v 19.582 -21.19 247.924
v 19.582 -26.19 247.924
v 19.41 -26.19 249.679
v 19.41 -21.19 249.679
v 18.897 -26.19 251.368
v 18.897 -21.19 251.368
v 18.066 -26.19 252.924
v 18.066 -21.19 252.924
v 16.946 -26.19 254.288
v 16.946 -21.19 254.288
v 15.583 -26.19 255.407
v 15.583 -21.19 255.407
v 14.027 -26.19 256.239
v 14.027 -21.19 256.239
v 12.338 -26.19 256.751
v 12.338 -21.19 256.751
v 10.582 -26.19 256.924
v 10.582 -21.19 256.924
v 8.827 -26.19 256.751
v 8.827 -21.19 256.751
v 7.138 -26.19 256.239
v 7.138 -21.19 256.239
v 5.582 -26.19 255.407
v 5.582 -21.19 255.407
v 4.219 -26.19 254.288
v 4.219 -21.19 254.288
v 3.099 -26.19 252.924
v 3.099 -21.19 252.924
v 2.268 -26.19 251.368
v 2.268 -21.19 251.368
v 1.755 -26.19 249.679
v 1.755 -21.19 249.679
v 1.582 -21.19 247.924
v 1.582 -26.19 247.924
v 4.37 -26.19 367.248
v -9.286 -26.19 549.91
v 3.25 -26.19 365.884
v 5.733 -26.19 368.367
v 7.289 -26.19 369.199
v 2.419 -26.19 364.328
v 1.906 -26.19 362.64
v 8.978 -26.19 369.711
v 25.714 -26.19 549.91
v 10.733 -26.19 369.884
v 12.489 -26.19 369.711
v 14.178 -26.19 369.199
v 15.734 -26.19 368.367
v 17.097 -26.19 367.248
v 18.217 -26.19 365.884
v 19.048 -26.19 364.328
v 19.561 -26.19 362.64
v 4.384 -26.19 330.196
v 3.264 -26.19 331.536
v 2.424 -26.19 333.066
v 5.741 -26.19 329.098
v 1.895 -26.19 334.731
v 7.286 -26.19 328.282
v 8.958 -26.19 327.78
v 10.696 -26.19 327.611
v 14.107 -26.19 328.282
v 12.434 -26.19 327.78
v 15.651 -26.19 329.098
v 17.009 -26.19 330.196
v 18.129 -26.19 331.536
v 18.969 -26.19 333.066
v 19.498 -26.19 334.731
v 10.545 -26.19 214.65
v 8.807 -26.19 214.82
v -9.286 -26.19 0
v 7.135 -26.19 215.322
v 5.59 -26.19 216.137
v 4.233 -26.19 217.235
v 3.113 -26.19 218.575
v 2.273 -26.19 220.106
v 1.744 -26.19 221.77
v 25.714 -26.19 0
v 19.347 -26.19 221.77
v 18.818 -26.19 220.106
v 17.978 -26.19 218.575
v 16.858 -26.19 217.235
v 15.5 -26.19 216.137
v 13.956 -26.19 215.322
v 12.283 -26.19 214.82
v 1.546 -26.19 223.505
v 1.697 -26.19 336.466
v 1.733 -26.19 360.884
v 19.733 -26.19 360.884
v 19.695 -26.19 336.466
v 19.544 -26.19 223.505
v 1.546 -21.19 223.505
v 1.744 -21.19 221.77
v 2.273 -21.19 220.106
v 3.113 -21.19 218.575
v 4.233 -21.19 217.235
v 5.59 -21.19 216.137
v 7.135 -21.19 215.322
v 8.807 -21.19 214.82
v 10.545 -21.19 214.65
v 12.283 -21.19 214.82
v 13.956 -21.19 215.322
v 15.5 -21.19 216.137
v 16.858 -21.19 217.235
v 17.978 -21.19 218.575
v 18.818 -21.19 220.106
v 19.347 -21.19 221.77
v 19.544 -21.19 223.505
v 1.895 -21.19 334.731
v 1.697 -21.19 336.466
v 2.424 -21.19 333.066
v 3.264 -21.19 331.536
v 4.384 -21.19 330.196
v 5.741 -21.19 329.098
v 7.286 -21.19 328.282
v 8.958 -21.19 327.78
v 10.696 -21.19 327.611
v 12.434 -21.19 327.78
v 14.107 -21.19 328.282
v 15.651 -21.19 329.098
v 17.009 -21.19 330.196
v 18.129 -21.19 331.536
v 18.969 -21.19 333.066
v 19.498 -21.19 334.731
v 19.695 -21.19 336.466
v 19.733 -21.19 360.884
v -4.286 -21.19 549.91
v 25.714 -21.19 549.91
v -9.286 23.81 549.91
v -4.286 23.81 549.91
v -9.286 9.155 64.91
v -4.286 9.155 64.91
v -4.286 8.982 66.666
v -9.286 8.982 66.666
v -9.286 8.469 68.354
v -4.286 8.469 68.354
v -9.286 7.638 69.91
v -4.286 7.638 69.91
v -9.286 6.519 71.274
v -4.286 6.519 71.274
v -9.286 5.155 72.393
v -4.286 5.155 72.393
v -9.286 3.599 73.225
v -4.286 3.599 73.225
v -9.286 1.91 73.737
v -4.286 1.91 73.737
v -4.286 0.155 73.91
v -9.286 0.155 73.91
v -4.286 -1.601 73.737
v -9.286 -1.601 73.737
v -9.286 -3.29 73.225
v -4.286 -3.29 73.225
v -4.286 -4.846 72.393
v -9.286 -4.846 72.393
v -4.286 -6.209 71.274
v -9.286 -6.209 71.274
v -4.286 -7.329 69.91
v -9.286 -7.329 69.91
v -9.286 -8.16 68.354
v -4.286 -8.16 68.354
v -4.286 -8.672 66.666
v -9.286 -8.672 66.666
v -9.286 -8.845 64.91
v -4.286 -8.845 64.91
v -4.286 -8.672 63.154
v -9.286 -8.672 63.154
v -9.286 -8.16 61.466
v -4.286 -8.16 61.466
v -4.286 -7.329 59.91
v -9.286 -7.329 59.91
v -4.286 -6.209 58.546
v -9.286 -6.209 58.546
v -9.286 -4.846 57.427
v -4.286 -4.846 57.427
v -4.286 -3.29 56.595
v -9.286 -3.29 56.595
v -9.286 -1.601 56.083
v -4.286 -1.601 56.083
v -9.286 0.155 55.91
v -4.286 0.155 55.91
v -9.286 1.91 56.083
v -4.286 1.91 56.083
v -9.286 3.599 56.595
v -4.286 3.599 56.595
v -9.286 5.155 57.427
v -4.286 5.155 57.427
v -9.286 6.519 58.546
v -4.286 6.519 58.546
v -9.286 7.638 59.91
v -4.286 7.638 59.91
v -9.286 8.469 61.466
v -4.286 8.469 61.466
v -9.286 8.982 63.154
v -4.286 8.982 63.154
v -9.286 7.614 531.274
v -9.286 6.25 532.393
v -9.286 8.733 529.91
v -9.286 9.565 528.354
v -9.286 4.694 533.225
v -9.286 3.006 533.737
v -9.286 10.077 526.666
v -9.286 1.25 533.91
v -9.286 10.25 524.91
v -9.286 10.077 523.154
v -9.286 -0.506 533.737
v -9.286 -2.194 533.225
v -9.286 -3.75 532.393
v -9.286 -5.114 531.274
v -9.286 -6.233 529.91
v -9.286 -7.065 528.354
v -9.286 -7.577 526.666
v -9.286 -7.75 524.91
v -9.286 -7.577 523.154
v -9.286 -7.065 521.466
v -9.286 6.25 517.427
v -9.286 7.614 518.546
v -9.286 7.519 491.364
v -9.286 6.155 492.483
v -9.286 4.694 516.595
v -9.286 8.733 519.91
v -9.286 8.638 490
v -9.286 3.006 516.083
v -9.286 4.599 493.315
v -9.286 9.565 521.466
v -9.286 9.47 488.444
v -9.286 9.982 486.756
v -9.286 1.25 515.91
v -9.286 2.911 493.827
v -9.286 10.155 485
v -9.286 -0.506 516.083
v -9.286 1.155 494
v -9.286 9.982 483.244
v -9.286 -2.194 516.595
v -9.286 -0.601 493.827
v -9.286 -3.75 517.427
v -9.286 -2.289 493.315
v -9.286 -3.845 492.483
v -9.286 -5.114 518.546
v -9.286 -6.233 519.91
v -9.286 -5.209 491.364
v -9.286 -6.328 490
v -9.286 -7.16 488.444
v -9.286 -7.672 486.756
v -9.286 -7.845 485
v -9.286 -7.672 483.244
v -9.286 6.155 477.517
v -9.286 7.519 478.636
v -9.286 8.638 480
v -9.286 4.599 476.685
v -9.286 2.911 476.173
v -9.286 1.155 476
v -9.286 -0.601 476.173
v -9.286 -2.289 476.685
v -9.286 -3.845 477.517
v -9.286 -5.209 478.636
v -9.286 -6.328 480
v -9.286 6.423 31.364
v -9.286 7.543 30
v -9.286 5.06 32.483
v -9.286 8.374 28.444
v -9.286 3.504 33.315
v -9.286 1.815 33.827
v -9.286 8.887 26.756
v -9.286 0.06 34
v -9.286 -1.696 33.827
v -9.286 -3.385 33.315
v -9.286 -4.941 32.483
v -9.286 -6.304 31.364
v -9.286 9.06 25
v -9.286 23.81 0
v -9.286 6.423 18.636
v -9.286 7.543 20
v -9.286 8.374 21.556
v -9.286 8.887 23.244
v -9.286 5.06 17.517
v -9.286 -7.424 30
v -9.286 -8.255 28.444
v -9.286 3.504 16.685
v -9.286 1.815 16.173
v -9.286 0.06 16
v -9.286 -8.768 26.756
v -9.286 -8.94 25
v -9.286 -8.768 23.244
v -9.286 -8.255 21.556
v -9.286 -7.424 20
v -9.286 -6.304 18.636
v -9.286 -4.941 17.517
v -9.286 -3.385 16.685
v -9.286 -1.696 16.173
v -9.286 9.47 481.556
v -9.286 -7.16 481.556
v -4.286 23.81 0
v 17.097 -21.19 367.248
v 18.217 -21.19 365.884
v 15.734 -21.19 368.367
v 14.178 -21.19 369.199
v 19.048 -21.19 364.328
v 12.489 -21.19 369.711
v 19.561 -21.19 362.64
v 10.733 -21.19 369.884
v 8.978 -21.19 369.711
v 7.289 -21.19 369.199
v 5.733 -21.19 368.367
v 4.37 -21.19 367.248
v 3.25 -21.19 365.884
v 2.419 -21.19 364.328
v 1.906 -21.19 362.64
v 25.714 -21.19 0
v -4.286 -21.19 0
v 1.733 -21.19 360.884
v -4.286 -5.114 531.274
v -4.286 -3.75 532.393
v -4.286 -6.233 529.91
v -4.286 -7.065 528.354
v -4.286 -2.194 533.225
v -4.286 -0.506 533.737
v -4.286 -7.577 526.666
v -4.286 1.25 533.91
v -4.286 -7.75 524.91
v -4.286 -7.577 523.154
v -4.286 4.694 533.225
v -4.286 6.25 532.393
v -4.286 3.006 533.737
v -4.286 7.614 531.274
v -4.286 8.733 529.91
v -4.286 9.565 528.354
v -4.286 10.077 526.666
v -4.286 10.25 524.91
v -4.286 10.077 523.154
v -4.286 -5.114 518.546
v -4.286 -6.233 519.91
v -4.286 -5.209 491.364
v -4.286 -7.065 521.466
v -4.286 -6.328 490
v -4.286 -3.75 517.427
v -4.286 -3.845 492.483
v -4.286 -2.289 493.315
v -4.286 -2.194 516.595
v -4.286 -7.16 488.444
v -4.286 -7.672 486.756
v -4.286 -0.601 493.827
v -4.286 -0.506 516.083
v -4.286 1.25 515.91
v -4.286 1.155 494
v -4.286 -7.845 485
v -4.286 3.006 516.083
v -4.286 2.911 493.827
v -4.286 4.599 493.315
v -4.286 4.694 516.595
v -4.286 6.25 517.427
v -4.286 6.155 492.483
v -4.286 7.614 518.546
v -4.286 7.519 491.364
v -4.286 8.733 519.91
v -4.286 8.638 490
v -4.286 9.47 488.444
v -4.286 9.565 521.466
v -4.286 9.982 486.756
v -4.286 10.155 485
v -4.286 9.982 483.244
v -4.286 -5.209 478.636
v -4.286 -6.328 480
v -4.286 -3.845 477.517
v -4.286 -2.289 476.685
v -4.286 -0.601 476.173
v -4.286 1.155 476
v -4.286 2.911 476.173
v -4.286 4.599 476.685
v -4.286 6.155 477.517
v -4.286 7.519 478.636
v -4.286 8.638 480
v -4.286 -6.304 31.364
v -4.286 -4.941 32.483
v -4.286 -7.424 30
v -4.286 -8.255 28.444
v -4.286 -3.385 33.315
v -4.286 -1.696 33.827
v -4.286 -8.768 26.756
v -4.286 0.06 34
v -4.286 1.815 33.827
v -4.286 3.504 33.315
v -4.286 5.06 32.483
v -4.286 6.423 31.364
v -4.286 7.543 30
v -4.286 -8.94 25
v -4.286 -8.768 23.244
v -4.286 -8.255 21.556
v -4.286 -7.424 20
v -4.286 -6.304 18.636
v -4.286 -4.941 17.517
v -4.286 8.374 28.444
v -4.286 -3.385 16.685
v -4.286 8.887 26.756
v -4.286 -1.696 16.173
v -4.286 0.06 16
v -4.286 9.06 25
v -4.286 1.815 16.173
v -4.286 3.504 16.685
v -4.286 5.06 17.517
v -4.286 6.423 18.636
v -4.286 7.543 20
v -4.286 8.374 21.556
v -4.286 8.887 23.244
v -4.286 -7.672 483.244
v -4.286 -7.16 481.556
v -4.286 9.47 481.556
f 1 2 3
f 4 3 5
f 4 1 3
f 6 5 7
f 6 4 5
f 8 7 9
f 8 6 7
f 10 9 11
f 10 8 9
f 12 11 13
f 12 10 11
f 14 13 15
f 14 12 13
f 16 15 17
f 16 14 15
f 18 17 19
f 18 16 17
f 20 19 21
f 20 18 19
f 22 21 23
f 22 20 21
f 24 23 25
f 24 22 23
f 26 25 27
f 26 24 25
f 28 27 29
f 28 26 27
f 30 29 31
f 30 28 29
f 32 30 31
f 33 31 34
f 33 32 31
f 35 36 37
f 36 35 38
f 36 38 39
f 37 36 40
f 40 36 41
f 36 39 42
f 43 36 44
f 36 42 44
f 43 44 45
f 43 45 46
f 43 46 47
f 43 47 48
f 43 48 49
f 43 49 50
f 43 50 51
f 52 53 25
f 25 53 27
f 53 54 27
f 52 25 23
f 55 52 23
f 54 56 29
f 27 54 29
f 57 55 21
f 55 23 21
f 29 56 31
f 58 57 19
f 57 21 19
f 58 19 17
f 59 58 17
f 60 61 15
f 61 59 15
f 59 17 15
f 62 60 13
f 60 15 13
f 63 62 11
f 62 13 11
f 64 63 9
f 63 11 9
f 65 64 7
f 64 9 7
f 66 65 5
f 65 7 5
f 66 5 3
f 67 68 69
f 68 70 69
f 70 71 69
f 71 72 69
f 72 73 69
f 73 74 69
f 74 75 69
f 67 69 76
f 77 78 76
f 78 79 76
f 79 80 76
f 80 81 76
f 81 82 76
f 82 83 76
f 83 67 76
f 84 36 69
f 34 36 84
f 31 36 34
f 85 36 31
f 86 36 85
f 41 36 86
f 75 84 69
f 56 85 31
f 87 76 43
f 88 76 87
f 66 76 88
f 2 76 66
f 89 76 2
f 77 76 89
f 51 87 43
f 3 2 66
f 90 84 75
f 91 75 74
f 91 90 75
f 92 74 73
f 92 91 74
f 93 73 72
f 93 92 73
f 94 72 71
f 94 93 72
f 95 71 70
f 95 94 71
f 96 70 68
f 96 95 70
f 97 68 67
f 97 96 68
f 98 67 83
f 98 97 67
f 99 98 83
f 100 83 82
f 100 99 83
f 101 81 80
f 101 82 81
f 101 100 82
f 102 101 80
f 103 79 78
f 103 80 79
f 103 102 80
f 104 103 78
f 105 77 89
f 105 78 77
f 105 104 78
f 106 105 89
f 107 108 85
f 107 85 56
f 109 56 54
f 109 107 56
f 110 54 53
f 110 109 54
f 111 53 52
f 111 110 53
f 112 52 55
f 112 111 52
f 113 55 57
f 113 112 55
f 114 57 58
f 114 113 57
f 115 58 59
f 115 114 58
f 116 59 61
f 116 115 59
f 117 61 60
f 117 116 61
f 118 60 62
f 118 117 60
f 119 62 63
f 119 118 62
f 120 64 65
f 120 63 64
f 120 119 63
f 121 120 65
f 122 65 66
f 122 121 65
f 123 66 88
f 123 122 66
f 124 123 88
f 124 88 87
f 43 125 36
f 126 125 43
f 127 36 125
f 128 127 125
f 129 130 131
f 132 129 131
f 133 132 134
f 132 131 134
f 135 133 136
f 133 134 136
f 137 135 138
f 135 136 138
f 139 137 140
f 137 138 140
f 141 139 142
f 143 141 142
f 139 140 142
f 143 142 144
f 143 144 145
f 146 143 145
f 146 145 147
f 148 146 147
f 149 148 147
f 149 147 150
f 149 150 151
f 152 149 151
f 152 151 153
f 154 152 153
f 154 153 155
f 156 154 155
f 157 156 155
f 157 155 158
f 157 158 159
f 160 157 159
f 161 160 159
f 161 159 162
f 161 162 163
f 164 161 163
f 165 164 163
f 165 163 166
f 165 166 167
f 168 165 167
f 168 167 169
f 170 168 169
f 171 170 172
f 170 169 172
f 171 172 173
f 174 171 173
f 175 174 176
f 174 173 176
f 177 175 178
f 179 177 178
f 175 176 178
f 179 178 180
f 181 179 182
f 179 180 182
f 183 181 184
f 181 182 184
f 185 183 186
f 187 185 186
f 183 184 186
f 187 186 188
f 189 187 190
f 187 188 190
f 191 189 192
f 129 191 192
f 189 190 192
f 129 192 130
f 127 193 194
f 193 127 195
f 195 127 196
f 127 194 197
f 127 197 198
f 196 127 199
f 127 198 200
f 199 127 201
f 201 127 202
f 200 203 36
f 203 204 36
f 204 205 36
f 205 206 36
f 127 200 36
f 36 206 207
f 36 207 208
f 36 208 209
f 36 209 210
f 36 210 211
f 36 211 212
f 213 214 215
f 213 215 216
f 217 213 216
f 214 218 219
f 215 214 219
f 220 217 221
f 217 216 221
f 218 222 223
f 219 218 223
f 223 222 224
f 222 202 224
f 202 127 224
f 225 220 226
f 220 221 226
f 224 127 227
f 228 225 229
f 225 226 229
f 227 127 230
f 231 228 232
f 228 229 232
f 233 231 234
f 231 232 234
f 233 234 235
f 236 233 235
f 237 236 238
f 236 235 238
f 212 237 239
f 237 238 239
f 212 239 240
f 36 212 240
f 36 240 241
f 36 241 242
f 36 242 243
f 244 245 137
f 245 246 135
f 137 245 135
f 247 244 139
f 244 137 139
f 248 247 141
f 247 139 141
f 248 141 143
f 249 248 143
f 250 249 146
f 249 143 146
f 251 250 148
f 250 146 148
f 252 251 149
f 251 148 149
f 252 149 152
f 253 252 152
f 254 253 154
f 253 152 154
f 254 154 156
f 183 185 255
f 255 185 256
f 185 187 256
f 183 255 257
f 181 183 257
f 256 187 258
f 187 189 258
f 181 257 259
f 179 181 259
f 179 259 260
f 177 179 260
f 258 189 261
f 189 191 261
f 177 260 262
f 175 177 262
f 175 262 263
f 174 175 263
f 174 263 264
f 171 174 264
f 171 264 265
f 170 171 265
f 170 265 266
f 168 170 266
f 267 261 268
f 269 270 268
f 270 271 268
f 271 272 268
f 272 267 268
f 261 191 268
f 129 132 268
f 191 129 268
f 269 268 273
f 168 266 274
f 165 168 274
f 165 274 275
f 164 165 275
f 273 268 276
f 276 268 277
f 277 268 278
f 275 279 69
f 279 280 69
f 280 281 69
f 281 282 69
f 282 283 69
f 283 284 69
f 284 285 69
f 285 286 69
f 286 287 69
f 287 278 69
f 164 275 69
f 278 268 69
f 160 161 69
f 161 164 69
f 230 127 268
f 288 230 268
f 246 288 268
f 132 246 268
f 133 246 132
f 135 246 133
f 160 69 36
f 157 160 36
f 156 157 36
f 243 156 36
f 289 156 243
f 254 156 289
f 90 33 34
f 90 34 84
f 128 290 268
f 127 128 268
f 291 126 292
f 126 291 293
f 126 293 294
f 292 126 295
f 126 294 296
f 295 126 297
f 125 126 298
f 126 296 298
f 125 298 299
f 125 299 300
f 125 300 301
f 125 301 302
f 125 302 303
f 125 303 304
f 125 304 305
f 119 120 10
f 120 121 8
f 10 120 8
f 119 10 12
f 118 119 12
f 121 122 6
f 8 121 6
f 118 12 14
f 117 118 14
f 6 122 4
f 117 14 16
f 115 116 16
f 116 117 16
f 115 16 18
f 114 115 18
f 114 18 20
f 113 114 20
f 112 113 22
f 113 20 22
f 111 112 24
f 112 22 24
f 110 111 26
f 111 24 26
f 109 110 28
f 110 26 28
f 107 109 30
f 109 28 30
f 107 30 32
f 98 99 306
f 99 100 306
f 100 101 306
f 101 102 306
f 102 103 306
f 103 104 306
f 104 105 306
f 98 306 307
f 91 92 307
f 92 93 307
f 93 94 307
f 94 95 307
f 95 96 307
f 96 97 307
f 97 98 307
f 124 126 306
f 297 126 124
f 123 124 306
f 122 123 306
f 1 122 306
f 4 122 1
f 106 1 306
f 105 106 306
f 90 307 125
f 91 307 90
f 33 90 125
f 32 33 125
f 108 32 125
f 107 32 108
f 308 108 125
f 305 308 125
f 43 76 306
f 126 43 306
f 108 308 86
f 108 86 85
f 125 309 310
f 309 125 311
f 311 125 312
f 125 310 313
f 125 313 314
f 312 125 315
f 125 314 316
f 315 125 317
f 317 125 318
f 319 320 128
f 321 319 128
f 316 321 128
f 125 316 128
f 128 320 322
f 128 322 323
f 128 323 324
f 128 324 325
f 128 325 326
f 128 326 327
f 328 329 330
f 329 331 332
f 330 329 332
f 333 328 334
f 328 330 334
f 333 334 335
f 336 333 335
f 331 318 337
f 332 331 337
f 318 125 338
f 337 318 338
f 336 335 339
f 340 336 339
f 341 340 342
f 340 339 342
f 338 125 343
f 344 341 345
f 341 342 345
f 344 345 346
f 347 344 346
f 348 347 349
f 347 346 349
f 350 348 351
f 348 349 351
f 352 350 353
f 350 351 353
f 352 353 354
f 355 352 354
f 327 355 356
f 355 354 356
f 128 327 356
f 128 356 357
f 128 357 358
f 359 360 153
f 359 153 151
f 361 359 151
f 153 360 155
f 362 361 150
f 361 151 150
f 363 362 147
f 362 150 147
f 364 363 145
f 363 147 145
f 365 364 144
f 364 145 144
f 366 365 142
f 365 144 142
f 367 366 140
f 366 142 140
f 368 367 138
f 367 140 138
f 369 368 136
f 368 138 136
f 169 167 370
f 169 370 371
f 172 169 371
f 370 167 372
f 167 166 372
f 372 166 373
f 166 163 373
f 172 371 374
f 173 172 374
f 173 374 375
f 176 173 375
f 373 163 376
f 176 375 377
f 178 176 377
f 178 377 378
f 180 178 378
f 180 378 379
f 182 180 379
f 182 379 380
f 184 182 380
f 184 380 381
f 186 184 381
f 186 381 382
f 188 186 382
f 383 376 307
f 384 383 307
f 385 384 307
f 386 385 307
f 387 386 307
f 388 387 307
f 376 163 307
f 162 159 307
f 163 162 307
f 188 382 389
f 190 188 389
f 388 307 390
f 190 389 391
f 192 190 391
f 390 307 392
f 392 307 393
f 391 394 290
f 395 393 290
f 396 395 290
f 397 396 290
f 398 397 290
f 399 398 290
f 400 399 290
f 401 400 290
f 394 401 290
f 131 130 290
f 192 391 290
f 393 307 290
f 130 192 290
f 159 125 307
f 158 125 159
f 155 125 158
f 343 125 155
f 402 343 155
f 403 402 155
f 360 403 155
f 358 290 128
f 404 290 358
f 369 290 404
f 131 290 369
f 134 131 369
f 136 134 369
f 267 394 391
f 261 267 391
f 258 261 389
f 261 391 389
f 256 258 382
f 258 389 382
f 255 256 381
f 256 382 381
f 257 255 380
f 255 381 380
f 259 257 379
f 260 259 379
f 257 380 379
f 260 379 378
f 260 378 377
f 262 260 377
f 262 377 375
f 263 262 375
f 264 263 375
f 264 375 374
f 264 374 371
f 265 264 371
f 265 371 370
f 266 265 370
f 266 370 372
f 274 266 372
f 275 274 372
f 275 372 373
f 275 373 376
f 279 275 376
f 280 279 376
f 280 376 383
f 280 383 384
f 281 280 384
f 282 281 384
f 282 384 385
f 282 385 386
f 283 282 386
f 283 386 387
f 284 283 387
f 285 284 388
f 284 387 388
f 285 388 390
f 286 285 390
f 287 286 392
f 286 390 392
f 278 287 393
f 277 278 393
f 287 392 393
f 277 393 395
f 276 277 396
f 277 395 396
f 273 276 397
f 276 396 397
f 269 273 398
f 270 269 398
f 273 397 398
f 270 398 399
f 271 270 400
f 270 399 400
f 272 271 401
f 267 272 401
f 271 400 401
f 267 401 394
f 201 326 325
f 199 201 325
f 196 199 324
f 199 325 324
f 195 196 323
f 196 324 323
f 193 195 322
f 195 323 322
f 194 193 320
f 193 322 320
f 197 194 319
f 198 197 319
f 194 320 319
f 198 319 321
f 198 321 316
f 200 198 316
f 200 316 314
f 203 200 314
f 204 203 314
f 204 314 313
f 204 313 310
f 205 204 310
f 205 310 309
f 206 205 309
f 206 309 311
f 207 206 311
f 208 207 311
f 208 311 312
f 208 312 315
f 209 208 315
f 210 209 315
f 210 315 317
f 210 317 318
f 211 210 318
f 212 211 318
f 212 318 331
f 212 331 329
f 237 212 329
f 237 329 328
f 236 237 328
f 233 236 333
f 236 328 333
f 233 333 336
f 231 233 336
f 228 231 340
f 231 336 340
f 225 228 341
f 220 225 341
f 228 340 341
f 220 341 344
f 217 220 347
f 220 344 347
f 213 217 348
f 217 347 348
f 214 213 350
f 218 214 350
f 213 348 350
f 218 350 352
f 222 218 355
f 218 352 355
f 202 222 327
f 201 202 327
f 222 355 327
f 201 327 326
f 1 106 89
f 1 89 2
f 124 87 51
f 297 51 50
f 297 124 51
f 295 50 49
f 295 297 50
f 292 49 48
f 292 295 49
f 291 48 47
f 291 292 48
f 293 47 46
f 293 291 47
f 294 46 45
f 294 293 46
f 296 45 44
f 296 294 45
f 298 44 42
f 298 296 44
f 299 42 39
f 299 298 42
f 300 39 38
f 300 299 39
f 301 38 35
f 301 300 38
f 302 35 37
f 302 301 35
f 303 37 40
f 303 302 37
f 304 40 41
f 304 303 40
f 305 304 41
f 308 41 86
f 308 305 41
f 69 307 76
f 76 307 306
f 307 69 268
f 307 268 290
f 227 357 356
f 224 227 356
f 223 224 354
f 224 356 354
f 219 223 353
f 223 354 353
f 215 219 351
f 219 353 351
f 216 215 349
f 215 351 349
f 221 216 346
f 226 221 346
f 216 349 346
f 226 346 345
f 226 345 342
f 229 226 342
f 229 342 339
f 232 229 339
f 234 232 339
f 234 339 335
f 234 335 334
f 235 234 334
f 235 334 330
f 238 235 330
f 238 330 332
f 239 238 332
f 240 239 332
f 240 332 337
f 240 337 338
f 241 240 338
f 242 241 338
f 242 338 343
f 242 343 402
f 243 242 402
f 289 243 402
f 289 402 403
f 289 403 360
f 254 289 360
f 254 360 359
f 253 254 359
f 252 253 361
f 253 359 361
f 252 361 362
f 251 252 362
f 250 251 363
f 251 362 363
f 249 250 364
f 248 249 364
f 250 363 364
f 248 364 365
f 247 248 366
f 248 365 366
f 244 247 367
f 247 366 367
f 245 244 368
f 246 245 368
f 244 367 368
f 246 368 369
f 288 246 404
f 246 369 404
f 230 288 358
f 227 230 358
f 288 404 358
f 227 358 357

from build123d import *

# Parameters (mm, degrees)
BOSS_EXTRUDE1_DEPTH = 549.91
SKETCH2_R           = 9
CUT_EXTRUDE1_DEPTH  = 10
CUT_EXTRUDE2_DEPTH  = 10


with BuildPart() as part:
    # Sketch1 → Boss-Extrude1 (new body)
    with BuildSketch(Plane.XY):
        Polygon((-9.285714286, 23.80952381), (-9.285714286, -26.19047619), (25.714285714, -26.19047619), (25.714285714, -21.19047619), (-4.285714286, -21.19047619), (-4.285714286, 23.80952381), align=None)
    extrude(amount=BOSS_EXTRUDE1_DEPTH)

    # Sketch2 → Cut-Extrude1 (cut)
    with BuildSketch(Plane(origin=(-4.285714286, 0, 0), x_dir=(0, 0, -1), z_dir=(1, 0, 0))):
        with Locations(Location((-524.91, 1.249990258, 0), (0, 0, 90))):
            Circle(SKETCH2_R)
        with Locations(Location((-485, 1.154950897, 0), (0, 0, 90))):
            Circle(SKETCH2_R)
        with Locations(Location((-64.91, 0.154572913, 0), (0, 0, 90))):
            Circle(SKETCH2_R)
        with Locations(Location((-25, 0.059533551, 0), (0, 0, 90))):
            Circle(SKETCH2_R)
    extrude(amount=-CUT_EXTRUDE1_DEPTH, mode=Mode.SUBTRACT)

    # Sketch3 → Cut-Extrude2 (cut)
    with BuildSketch(Plane(origin=(0, -21.19047619, 0), x_dir=(1, 0, 0), z_dir=(0, 1, 0))):
        with BuildLine():
            Line((1.733492456, -360.884266397), (1.697419827, -336.465805265))
            ThreePointArc((1.697419827, -336.465805265), (10.6962494, -327.610947677), (19.695078973, -336.465805265))
            Line((19.695078973, -336.465805265), (19.733492456, -360.884266397))
            ThreePointArc((19.733492456, -360.884266397), (10.733492456, -369.884266397), (1.733492456, -360.884266397))
        make_face()
        with BuildLine():
            Line((1.582473361, -247.923607511), (1.546400733, -223.505146379))
            ThreePointArc((1.546400733, -223.505146379), (10.545230305, -214.650288791), (19.544059878, -223.505146379))
            Line((19.544059878, -223.505146379), (19.582473361, -247.923607511))
            ThreePointArc((19.582473361, -247.923607511), (10.582473361, -256.923607511), (1.582473361, -247.923607511))
        make_face()
    extrude(amount=-CUT_EXTRUDE2_DEPTH, mode=Mode.SUBTRACT)


solid = part.part
